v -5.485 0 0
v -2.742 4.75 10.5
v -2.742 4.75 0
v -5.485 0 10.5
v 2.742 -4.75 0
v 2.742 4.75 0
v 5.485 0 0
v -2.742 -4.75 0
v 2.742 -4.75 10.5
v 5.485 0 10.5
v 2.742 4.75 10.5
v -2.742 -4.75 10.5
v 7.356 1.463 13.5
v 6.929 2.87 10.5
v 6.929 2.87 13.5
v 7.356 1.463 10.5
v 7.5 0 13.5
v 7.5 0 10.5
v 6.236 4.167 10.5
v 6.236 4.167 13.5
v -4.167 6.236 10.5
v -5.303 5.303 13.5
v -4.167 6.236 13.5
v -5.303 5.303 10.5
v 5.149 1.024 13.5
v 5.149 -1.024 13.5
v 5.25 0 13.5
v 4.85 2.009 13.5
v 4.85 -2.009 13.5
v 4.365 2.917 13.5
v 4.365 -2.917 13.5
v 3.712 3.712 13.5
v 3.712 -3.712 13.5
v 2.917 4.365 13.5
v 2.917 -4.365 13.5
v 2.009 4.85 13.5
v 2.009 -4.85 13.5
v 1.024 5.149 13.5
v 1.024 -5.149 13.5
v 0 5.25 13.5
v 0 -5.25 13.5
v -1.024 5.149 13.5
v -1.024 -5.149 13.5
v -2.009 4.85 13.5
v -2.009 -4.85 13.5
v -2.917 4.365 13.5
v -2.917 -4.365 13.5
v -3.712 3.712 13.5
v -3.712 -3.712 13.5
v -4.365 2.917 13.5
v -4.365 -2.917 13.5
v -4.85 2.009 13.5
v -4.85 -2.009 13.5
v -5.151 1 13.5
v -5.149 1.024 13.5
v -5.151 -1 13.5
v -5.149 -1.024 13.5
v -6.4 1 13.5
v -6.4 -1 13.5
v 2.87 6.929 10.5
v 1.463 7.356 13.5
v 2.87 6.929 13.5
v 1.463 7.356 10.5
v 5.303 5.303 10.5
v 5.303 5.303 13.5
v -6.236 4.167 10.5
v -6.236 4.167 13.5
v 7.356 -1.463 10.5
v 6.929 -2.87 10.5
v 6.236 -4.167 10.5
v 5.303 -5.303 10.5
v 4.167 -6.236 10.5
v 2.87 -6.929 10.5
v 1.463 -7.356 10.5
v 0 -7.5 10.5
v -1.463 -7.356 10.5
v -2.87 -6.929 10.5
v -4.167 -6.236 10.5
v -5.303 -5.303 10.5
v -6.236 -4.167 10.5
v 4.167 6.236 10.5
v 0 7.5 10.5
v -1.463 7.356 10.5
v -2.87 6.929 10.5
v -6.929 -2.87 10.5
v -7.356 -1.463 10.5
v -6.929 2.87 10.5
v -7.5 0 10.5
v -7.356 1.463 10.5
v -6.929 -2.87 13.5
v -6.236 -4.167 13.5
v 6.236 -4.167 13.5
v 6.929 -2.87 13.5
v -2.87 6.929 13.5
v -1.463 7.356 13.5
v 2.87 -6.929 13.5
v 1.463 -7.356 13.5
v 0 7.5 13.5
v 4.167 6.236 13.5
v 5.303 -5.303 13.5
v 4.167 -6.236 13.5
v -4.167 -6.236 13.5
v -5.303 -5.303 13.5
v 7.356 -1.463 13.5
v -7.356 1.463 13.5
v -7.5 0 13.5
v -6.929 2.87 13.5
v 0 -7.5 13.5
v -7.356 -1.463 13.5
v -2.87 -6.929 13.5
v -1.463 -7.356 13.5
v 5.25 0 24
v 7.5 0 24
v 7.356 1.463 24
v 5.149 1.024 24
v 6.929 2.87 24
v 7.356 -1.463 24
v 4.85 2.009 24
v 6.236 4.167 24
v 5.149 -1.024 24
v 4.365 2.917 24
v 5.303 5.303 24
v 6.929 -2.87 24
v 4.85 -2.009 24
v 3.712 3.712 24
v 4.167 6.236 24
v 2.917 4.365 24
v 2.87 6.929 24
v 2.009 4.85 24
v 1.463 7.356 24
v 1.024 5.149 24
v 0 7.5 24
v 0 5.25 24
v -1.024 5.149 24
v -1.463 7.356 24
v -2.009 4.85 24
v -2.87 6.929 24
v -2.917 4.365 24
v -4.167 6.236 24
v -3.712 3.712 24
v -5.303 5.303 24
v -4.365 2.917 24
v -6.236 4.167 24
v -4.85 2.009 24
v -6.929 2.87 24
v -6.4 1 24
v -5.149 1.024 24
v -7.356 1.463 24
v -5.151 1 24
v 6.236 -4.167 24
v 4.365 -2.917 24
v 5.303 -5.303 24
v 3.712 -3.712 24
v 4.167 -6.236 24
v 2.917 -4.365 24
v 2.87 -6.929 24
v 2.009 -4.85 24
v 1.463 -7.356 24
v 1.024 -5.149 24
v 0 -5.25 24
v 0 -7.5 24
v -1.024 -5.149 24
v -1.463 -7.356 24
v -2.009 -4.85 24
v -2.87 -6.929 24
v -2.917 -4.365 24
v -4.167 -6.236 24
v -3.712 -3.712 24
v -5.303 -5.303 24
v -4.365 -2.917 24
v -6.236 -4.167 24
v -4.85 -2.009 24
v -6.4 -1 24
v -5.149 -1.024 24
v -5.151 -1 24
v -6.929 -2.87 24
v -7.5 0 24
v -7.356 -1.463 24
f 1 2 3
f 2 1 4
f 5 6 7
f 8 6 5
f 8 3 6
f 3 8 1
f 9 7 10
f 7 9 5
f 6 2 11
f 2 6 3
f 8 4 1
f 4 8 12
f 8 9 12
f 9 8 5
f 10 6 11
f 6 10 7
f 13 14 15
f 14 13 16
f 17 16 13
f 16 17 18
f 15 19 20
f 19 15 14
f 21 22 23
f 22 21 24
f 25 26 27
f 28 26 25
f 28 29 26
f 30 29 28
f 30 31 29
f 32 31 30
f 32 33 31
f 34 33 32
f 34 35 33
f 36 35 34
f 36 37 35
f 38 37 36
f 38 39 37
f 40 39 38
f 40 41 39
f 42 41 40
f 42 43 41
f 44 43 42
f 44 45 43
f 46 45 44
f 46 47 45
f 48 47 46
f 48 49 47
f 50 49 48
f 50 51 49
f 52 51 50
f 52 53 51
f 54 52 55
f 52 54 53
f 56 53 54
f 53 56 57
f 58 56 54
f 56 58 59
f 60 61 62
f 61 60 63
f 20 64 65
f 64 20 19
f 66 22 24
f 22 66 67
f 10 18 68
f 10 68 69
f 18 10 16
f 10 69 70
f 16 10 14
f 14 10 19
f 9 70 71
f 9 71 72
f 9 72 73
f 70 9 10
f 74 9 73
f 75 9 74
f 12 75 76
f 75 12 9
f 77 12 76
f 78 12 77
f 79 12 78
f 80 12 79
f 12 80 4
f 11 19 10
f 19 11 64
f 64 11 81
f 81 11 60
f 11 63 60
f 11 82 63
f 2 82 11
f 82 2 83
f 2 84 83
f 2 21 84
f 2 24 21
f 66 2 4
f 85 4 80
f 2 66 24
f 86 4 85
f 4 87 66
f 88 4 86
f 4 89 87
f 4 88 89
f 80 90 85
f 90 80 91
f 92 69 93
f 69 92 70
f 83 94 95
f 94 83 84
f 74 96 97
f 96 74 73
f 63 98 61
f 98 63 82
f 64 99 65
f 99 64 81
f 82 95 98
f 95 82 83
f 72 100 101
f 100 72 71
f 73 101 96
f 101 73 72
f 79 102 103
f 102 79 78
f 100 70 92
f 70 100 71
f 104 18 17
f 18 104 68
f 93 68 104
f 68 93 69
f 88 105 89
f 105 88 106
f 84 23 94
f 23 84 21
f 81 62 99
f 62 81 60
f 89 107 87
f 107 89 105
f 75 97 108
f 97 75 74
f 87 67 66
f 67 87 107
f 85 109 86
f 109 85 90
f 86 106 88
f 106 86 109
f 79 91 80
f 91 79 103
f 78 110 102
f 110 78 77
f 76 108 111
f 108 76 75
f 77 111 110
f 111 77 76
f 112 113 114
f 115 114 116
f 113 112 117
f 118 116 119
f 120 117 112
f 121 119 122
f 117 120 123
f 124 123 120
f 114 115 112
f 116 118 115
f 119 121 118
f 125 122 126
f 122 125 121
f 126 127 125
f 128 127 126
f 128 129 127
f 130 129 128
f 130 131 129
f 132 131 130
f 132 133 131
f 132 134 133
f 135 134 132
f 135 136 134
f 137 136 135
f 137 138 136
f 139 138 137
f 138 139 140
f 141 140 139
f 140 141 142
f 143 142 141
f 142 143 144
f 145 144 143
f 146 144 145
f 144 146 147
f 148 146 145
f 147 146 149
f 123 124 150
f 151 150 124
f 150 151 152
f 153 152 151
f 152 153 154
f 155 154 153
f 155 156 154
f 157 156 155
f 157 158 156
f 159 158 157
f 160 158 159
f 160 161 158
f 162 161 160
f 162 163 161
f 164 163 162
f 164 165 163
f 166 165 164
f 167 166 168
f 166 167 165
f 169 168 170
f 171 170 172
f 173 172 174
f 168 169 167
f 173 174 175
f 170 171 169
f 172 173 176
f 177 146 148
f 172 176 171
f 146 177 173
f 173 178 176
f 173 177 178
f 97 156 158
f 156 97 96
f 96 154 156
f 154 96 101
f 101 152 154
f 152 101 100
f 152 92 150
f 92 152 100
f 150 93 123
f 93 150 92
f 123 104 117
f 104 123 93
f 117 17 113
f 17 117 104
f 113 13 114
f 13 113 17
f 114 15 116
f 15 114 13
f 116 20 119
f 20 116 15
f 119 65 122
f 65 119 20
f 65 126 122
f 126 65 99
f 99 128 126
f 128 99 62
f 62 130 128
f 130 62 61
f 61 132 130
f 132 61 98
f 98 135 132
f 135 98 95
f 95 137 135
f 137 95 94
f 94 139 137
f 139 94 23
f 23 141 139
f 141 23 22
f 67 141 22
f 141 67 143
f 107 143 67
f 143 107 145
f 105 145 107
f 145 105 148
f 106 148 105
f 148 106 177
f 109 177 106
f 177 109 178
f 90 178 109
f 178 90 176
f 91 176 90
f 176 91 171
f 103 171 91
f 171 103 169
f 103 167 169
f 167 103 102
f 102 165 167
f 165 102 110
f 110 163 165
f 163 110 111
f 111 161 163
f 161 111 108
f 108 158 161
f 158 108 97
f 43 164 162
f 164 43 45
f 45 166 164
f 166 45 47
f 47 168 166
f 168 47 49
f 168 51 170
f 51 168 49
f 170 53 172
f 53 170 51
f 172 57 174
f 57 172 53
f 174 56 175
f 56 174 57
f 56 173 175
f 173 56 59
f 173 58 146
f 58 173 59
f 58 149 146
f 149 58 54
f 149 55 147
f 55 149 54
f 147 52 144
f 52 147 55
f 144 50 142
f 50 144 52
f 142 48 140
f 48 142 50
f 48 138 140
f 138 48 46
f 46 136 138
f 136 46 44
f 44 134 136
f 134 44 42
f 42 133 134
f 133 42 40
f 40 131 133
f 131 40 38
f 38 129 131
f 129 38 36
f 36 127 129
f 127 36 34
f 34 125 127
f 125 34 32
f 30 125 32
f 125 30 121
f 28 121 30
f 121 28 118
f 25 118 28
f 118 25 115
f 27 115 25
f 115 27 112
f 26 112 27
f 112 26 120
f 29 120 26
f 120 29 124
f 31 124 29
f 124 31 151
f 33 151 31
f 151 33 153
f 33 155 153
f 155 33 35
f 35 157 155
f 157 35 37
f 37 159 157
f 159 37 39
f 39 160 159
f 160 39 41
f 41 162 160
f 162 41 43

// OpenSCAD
inch = 25.4*1;
$fn=32*1;

TEST_MODE = 0*1;

/* [Shaft 1] */

// Shape of shaft 1 (the lower part of the coupler).
s1_type = "HEX"; // [HEX,SQUARE,ROUND,ROUND+KEY,ROUND+1FLAT,ROUND+2FLAT]

// Gender of shaft 1.
s1_gender = "MALE"; // [MALE,FEMALE]

// Diameter of shaft 1 (mm). For SQUARE and HEX, this is measured across the flats.
s1_dia  = 10;

// For ROUND+KEY, this is the size of the keyway (mm). For ROUND+1FLAT and ROUND+2FLAT, this is the amount of the round shaft that is shaved off to make the flat (mm).
s1_cutout = 2;

// Length of the coupler on the shaft 1 side (mm).
s1_length = 12;

// Tolerance percentage -- how much to shrink a male shaft or how much to grow a female receiver (percentage).
s1_tol_pct = 5; // [0:15]





/* [Shaft 2] */

// Shape of shaft 2 (the upper part of the coupler).
s2_type = "ROUND+KEY"; // [HEX,SQUARE,ROUND,ROUND+KEY,ROUND+1FLAT,ROUND+2FLAT]

// Gender of shaft 2.
s2_gender = "FEMALE"; // [MALE,FEMALE]

// Diameter of shaft 1 (mm). For SQUARE and HEX, this is measured across the flats.
s2_dia  = 10;

// For ROUND+KEY, this is the size of the keyway (mm). For ROUND+1FLAT and ROUND+2FLAT, this is the amount of the round shaft that is shaved off to make the flat (mm).
s2_cutout = 2;

// Length of the coupler on the shaft 1 side (mm).
s2_length = 12;

// Tolerance percentage -- how much to shrink a male shaft or how much to grow a female receiver (percentage).
s2_tol_pct = 5; // [0:15]





/* [General settings] */

// For male/female couplers, how much of the middle area to fill in for structural strength (mm). This doesn't add to the coupler length, rather it just "fills in" some of the two sides with solid matter.
middle_length = 3;

// For ROUND FEMALE couplers, diameter of side holes for set screws (mm).
set_screw_dia = 3;

// How much to "back off" the keyway depth. A value of 0.50 would mean that half the key is in the male shaft and half is in the female receiver. Higher values give more play for the key, and are a form of tolerance.  
keyway_depth_factor = 0.70*1;

// For couplers where shaft 1 is male, shaft 2 is female, and shaft 1 is significantly larger than shaft 2, we'll attempt to make a "single form" coupler, wherein shaft 2 goes entirely inside of the coupler, basically adapting it to become the size of shaft 1. If this behavior is undesired, set this to "Yes", and a standard two-sided coupler will be generated.
disable_single_form = 0; // [0:No, 1:Yes]

attempt_single_form = !disable_single_form;

// For female receivers, minimum amount of plastic on the outside for strength (mm).
min_thickness = 3;

// For female ROUND types, minimum amount of plastic on the outside -- the setscrew will go through this material, so it's typically a bit more than just min_thickness
thickness_for_setscrews = 6;




// take the measure across the flats and make it into the measure across the points
function flats2points(form,d) = 
    form=="HEX"    ? d*(2/sqrt(3)) : 
    form=="SQUARE" ? d*(2/sqrt(2)) : 
    form=="TRIANGLE" ? d*(sqrt(2)) : 
    d; // < round forms have no change

module hexagon(dia_flats) {
    circle($fn=6,d=flats2points("HEX",dia_flats));
}

module shaft_form(form, gender, d, tol, cutout=0) {
    tol_factor = gender=="MALE" ? (1-tol) : (1+tol);
    dd = d*tol_factor;
    if      (form=="HEX") hexagon(dd);
    else if (form=="TRIANGE") circle($fn=3,d=dd);
    else if (form=="PENT") circle($fn=5,d=dd); // << aint nobody gonna need this
    else if (form=="SQUARE") square(dd,center=true);
    else if (form=="ROUND") circle(d=dd);
    else if (form=="ROUND+1FLAT" || form=="ROUND+2FLAT") {
        difference() {
            circle(d=dd);
            for (m = form=="ROUND+2FLAT" ? [0,1] : [0]) {
                mirror([0,m,0]) translate([-dd/2, (d/2-cutout)*tol_factor]) square([dd,dd]);
            }
        }
    }else if(form=="ROUND+KEY") {
        if (gender=="FEMALE") {
            circle(d=dd);
            rotate(90) translate([-cutout/2,0]) square([cutout,d/2+cutout*keyway_depth_factor]);
        } else {
            difference() {
                circle(d=dd);
                translate([-cutout/2,d/2-cutout*keyway_depth_factor]) square([cutout,cutout]);
            }
        }
    }
}

// types: ["HEX","SQUARE","ROUND","ROUND+KEY","ROUND+1FLAT","ROUND+2FLAT"]
//    also valid, but may have bugs for certain geometries: ["TRIANGLE","PENT"]
// genders: ["MALE","FEMALE"]
module coupler(
    s1_type, s1_gender, s1_dia, s1_cutout, s1_tol_pct, s1_length, 
    s2_type, s2_gender, s2_dia, s2_cutout, s2_tol_pct, s2_length, 
    set_screw_dia = 3, 
    keyway_depth_factor = 0.70, 
    attempt_single_form = true, 
    min_thickness = 3, 
    thickness_for_setscrews = 6) {
        
    //echo(">>",s1_type, s1_gender, s1_dia, s1_cutout, s1_tol_pct, s1_length,     s2_type, s2_gender, s2_dia, s2_cutout, s2_tol_pct, s2_length);

    s1_tol = s1_tol_pct/100;
    s2_tol = s2_tol_pct/100;
    s1_dia_max = flats2points(s1_type, s1_dia);
    s2_dia_max = flats2points(s2_type, s2_dia);

    // all-in-one mode?
    if (attempt_single_form && s1_gender=="MALE" && s2_gender=="FEMALE" && s1_dia/2-s2_dia/2>=min_thickness) {
        
        color("cyan") difference() {
            linear_extrude(s1_length+s2_length, convexity=5) difference() {
                shaft_form(s1_type, s1_gender, s1_dia, s1_tol, s1_cutout);
                shaft_form(s2_type, s2_gender, s2_dia, s2_tol, s2_cutout);
            }
        
            // we do s2 set screws only, since it doesnt make sense to do the s1 set screw holes, since s1 is male by definition here
            
            // s2 set screws
            if (s2_type=="ROUND") {
                set_screw_angles = 
                    s1_type=="HEX" ? [30,150,270] : 
                    s1_type=="ROUND+KEY" ? [0,180,270] : 
                    [0,90,180,270];
                for (theta = set_screw_angles) {
                    rotate(theta) translate([0,0,s1_length+s2_length/2]) rotate([0,90,0]) cylinder(d=set_screw_dia, h=s1_dia+1);
                }
            }
        }
        
    } else {
        // normal two-sided thing
        
        // thickness is valid for female only, but needed for below general calculation
        thickness1 = 
            s1_type=="ROUND"?thickness_for_setscrews:
            s1_type=="ROUND+KEY"?min_thickness+s1_cutout:
            min_thickness;
        od1 = s1_dia_max + (s1_gender=="FEMALE" ? thickness1 : 0);

        thickness2 = 
            s2_type=="ROUND"?thickness_for_setscrews:
            s2_type=="ROUND+KEY"?min_thickness+s2_cutout:
            min_thickness;
        od2 = s2_dia_max + (s2_gender=="FEMALE" ? thickness2 : 0);
        
        od = max(od1,od2);

        if (s1_gender=="MALE") {
            linear_extrude(s1_length, convexity=5) {
                shaft_form(s1_type, s1_gender, s1_dia, s1_tol, s1_cutout);
            }
        } else { // s1_gender FEMALE
            difference() {
                linear_extrude(s1_length, convexity=5) difference() {
                    circle(d=od);
                    shaft_form(s1_type, s1_gender, s1_dia, s1_tol, s1_cutout);
                }
                if (s1_type=="ROUND") {
                    set_screw_angles = [0,90,180,270];
                    for (theta = set_screw_angles) {
                        rotate(theta) translate([0,0,s1_length/2]) rotate([0,90,0]) cylinder(d=set_screw_dia, h=od);
                    }
                }
            }
        }
        
        if (s1_gender!=s2_gender) {
            translate([0,0,s1_length-middle_length/2]) {
                cylinder(d=od, h=middle_length);
            }
        }
        
        translate([0,0,s1_length]) {
            if (s2_gender=="MALE") {
                linear_extrude(s2_length, convexity=5) {
                    shaft_form(s2_type, s2_gender, s2_dia, s2_tol, s2_cutout);
                }
            } else { // s2_gender FEMALE
                difference() {
                    linear_extrude(s2_length, convexity=5) difference() {
                        circle(d=od);
                        shaft_form(s2_type, s2_gender, s2_dia, s2_tol, s2_cutout);
                    }
                    if (s2_type=="ROUND") {
                        set_screw_angles = [0,90,180,270];
                        for (theta = set_screw_angles) {
                            rotate(theta) translate([0,0,s2_length/2]) rotate([0,90,0]) cylinder(d=set_screw_dia, h=od);
                        }
                    }
                }
            }
            
            
        }
            
    }
}

module TEST_ALL() {
    // test all combinations and lay them out in a big array
    types = ["HEX","SQUARE","ROUND","ROUND+KEY","ROUND+1FLAT","ROUND+2FLAT"];
    genders = ["MALE","FEMALE"];
    dias1 = [15];
    dias2 = [9]; //dias1;
    cutout = 2;
    tol = 5;
    s_length = 10;
    for (s1_type_i = [0:len(types)-1]) {
        s1_type = types[s1_type_i];
        
        for (s1_gender_i = [0:len(genders)-1]) {
            s1_gender = genders[s1_gender_i];
            
            for (s1_dia_i = [0:len(dias1)-1]) {
                s1_dia = dias1[s1_dia_i];
                
                for (s2_type_i = [0:len(types)-1]) {
                    s2_type = types[s2_type_i];
                    
                    for (s2_gender_i = [0:len(genders)-1]) {
                        s2_gender = genders[s2_gender_i];
                        
                        for (s2_dia_i = [0:len(dias2)-1]) {
                            s2_dia = dias2[s2_dia_i];
                            
                            x = (s1_type_i*len(genders)+s1_gender_i)*len(dias1)+s1_dia_i;
                            y = (s2_type_i*len(genders)+s2_gender_i)*len(dias2)+s2_dia_i;
                            echo(x,y, 
                                s1_type,s1_gender,s1_dia,cutout,tol,s_length,
                                s2_type,s2_gender,s2_dia,cutout,tol,s_length);
                            
                            translate([30*x,30*y]) coupler(
                                s1_type,s1_gender,s1_dia,cutout,tol,s_length,
                                s2_type,s2_gender,s2_dia,cutout,tol,s_length
                            );
                        }
                    }
                }
            }
        }
    }
}


if (TEST_MODE) {
    TEST_ALL();
    
} else {
    coupler(
        s1_type, s1_gender, s1_dia, s1_cutout, s1_tol_pct, s1_length, 
        s2_type, s2_gender, s2_dia, s2_cutout, s2_tol_pct, s2_length, 
        set_screw_dia, 
        keyway_depth_factor, 
        attempt_single_form, 
        min_thickness, 
        thickness_for_setscrews);
}
